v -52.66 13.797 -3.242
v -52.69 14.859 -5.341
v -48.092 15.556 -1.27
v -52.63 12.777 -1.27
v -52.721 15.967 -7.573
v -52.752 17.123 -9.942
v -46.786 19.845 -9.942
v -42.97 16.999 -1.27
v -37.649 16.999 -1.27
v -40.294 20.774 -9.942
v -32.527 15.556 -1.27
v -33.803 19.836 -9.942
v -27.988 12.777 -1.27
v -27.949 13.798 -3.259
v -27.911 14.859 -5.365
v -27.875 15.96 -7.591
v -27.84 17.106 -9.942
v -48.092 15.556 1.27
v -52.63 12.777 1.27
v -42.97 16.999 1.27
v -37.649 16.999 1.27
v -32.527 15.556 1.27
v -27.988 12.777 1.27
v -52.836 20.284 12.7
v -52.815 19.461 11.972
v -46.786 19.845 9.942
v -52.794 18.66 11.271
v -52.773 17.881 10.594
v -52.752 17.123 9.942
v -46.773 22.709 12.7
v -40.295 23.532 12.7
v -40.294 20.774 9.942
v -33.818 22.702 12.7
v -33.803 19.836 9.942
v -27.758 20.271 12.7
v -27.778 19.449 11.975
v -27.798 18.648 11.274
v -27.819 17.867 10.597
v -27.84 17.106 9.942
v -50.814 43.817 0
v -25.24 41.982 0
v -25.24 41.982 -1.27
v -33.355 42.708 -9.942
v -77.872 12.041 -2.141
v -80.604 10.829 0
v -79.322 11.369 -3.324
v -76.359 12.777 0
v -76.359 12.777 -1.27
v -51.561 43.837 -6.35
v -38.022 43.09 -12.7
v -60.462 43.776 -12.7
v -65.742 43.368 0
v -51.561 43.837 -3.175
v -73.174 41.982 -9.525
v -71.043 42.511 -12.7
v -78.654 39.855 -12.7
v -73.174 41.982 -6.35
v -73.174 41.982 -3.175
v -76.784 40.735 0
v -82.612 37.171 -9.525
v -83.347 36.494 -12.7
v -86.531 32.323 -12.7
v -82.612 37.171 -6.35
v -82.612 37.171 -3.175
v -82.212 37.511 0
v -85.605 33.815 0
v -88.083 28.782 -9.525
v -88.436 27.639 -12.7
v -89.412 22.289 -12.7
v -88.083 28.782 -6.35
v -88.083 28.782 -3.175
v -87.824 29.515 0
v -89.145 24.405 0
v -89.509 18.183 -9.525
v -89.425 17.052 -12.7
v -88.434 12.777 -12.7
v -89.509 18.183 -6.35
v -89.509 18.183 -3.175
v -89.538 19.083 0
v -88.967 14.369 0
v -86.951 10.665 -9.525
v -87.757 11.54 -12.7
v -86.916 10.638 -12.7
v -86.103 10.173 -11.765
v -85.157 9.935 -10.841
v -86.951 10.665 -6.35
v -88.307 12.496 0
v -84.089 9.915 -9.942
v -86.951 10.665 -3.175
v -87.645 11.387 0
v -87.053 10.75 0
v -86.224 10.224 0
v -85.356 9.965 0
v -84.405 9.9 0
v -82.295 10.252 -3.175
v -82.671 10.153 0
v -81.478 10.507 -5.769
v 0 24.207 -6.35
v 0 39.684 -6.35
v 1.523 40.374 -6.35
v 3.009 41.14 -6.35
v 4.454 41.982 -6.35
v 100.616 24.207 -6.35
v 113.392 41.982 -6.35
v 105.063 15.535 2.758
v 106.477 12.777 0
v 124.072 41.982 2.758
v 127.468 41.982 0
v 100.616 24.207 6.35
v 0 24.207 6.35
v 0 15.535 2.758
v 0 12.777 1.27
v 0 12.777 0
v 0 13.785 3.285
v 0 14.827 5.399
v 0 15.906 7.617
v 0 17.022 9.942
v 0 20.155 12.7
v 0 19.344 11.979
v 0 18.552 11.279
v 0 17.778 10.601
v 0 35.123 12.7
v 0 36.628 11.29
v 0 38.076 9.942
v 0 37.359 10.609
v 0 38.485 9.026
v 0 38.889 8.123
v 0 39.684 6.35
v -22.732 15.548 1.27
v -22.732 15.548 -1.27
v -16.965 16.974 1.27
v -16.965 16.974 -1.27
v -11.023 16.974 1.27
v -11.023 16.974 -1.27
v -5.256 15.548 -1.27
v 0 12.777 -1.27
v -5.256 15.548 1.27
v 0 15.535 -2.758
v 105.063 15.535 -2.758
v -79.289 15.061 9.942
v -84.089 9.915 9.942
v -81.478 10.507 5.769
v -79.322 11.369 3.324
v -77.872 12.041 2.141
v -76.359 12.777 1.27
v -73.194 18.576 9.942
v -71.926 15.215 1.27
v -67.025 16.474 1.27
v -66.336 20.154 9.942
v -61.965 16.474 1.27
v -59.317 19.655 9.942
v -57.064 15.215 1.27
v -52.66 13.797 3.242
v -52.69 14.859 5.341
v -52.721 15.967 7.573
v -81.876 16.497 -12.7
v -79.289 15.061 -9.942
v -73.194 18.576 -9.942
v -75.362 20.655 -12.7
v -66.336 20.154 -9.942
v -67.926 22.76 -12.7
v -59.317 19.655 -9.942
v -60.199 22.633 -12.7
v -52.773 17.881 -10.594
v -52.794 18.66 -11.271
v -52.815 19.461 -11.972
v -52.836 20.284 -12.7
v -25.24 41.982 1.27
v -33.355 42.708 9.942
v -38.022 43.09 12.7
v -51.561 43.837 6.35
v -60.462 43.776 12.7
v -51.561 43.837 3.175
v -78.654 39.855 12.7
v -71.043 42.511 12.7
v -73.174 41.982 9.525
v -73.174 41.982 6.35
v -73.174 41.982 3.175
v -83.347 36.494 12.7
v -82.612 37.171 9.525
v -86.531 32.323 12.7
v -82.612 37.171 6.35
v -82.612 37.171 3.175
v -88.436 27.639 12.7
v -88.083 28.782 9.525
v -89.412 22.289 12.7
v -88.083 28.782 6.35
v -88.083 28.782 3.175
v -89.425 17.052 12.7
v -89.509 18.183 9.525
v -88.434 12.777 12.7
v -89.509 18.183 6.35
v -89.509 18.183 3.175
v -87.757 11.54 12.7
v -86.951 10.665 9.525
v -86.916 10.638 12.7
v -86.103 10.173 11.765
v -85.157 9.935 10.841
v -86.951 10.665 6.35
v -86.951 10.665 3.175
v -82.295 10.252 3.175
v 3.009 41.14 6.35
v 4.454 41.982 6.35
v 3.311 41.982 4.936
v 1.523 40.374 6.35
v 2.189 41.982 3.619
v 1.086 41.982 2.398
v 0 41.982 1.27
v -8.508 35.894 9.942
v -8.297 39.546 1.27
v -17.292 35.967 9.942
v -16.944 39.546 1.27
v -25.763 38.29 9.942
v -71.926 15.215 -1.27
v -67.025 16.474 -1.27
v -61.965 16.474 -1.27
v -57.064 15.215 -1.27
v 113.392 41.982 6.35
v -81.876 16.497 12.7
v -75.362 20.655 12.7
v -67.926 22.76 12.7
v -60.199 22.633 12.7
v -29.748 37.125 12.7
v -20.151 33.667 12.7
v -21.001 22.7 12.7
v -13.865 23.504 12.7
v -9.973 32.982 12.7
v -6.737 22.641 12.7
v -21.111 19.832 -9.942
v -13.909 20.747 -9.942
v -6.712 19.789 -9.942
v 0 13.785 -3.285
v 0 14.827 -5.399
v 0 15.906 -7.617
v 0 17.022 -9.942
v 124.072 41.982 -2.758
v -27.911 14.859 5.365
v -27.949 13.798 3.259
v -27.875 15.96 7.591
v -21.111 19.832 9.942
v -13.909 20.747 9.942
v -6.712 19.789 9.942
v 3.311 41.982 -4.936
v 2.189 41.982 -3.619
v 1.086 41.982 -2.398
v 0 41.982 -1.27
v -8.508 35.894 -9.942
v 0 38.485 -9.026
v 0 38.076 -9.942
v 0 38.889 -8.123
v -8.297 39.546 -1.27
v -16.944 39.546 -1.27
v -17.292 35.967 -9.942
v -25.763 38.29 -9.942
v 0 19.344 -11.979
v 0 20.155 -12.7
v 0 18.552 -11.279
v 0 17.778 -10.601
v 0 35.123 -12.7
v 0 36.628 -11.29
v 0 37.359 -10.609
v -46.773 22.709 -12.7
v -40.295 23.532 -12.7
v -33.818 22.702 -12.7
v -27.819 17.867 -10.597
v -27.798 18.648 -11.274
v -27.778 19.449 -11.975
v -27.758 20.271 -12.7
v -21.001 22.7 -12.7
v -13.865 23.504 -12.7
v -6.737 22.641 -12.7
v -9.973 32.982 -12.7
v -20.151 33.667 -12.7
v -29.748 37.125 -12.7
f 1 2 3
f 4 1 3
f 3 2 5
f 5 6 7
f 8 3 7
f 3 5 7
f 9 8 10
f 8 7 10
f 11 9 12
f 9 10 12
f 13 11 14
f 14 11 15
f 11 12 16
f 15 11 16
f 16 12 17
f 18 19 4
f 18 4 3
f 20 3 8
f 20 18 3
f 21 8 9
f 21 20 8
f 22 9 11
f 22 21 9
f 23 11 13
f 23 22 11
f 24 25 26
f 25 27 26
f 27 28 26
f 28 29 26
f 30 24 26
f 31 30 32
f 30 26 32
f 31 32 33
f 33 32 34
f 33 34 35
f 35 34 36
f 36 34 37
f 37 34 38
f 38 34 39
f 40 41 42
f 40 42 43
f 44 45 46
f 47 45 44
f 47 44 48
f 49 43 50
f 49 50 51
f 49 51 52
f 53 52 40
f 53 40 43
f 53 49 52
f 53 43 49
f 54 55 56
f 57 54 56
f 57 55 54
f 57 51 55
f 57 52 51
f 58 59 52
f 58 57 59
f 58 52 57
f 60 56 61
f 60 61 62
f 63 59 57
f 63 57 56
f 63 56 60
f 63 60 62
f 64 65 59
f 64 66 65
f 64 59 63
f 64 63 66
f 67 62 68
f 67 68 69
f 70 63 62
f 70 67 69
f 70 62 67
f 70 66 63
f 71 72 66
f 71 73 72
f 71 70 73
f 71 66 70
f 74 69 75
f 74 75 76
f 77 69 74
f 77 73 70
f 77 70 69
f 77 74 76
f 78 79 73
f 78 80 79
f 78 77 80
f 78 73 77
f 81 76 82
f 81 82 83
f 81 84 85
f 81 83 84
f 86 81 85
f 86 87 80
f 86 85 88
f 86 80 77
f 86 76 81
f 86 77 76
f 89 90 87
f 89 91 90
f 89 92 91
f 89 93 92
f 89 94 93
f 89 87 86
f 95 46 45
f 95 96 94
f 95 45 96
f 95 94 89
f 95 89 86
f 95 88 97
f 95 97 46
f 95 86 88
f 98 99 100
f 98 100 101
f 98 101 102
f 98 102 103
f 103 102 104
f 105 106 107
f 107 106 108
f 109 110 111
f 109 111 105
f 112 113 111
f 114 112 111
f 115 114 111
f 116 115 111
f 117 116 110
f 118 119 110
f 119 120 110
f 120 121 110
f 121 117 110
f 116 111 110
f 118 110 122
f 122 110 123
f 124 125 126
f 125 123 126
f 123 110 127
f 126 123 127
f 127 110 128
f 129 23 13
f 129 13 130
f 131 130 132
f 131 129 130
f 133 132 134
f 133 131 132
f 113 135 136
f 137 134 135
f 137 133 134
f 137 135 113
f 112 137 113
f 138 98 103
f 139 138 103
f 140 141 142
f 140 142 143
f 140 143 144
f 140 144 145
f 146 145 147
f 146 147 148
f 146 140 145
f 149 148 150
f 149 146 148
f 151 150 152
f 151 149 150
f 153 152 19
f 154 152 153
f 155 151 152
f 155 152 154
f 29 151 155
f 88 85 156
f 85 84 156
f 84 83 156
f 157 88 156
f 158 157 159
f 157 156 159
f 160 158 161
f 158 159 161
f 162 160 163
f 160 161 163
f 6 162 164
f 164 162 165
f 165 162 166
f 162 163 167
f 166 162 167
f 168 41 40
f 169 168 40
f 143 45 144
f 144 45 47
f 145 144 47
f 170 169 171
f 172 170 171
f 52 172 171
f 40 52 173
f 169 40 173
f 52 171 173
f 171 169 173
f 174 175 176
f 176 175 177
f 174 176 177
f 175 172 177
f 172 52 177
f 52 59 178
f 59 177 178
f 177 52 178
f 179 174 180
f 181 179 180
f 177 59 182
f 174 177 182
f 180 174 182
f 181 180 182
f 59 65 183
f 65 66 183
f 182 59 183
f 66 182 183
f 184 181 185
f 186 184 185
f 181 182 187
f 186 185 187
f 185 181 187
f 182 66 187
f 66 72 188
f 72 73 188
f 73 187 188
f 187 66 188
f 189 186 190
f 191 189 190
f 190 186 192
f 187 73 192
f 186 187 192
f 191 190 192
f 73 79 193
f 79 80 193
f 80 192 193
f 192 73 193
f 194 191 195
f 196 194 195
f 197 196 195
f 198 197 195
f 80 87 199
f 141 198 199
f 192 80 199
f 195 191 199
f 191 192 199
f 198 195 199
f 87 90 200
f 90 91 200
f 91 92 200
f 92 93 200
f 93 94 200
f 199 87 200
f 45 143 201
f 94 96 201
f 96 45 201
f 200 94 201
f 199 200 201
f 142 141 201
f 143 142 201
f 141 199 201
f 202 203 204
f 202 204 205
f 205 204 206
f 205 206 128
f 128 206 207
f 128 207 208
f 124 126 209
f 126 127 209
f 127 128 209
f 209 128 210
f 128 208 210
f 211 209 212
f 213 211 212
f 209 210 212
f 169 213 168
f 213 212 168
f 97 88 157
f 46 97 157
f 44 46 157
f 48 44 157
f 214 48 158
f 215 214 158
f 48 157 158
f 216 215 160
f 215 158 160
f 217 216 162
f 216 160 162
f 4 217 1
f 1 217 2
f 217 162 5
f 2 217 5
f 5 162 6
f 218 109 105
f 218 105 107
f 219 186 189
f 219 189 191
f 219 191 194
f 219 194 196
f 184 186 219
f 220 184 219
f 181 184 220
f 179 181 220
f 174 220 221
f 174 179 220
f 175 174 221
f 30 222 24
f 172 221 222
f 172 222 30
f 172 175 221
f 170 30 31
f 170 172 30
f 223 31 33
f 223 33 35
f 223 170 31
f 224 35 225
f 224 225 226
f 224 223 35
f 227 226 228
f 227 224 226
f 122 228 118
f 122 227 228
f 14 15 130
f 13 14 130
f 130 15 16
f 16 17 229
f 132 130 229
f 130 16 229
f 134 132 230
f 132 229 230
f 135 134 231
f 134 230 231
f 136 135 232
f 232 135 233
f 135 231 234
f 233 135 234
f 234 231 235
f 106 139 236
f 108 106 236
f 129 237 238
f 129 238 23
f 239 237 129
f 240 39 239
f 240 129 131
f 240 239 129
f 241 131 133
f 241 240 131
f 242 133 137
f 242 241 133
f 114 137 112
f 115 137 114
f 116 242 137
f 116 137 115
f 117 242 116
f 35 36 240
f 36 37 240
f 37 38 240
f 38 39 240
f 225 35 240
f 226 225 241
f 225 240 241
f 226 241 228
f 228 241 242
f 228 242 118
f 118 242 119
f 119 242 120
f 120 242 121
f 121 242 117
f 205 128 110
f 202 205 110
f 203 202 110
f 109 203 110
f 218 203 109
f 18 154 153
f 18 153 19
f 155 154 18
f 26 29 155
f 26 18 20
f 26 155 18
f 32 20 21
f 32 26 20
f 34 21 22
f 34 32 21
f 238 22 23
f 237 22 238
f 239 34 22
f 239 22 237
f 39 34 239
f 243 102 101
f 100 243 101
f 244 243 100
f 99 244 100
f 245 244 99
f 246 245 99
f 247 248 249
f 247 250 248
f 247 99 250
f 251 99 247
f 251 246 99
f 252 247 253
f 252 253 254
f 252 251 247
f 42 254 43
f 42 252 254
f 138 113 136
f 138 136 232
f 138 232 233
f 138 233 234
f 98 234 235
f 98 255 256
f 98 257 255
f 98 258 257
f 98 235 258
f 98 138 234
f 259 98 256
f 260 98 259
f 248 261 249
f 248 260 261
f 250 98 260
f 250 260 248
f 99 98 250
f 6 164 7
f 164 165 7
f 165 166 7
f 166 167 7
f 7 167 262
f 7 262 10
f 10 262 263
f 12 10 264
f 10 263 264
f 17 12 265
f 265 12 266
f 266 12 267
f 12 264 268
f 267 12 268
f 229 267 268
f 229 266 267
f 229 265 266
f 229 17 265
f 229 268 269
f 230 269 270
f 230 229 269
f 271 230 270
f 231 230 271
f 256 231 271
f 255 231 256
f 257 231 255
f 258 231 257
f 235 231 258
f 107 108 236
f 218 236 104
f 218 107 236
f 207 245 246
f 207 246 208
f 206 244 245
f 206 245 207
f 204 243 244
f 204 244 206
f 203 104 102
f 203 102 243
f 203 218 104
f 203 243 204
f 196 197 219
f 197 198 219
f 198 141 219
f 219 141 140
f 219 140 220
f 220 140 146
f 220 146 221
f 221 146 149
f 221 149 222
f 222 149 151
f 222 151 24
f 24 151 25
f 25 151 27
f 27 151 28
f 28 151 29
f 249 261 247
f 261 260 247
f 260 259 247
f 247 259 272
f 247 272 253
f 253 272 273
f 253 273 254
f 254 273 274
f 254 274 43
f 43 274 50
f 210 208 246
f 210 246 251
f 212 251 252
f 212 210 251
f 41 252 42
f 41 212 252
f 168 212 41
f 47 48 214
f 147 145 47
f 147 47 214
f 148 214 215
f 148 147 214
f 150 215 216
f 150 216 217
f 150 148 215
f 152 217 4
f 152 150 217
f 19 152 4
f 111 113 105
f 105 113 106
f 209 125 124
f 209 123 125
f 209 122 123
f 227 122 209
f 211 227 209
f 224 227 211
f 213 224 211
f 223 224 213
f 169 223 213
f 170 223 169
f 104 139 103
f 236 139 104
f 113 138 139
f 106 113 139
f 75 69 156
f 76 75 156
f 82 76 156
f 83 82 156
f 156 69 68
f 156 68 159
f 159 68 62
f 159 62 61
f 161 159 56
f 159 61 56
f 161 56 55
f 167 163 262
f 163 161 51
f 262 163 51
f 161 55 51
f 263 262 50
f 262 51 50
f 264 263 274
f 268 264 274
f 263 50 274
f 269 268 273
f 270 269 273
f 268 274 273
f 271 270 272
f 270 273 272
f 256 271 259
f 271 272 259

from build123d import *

# Parameters (mm, degrees)
F1_DEPTH      = 6.35
F1_DEPTH_BACK = 6.35
F2_DEPTH      = 12.7
F2_DEPTH_BACK = 12.7
F3_SIZE       = 6.34999
F4_SIZE       = 6.35
F5_T2_ANGLE   = 130.9531767825
F5_T4_ANGLE   = 156.3789559007
F5_T6_ANGLE   = 146.8131509544
F5_T8_ANGLE   = 146.8131509544
F5_T10_ANGLE  = 156.3789559007
F5_T12_ANGLE  = 130.9531767825
F5_T14_ANGLE  = 98.8047724995
F5_T16_ANGLE  = 98.8047724995
F6_SIZE       = 5.08


# Not quite as in the source:
# - a fillet or chamfer that OpenCascade refuses, or shapes differently, is made with other operations: its cross-section is extruded or revolved along the edge and cut away or added
# - a fillet or chamfer is up to 0.001 mm smaller than in the source, because OpenCascade refuses the exact size


with BuildPart() as f1:
    # F0 (on Top) → F1 (new body, two sides)
    with BuildSketch(Plane.XY) as f1_sk:
        Polygon((127.4684071541, 41.98243469), (0, 41.98243469), (0, 12.7772623673), (106.4771935344, 12.7772623673), align=None)
    extrude(amount=F1_DEPTH)
    extrude(f1_sk.sketch, amount=-F1_DEPTH_BACK)

    # F0 (on Top) → F2 (join, two sides)
    with BuildSketch(Plane.XY) as f2_sk:
        with BuildLine():
            Line((0, 12.7772623673), (0, 41.98243469))
            ThreePointArc((0, 41.98243469), (-12.6201109961, 39.2362751187), (-25.2402219921, 41.98243469))
            add(Edge.make_bspline(
                [(-25.2402219921, 41.98243469), (-43.3102802692, 43.6309922068), (-73.0269834828, 46.3420899634), (-90.5393262642, 31.6872008955), (-89.8712560793, 6.151344998), (-80.4582887069, 10.7672416687), (-76.3593539596, 12.7772623673)],
                knots=[0, 0, 0, 0, 0.3656879222, 0.6013837524, 0.8264200944, 1, 1, 1, 1], degree=3))
            ThreePointArc((-76.3593539596, 12.7772623673), (-64.4947532564, 16.6330166618), (-52.6301525533, 12.7772623673))
            ThreePointArc((-52.6301525533, 12.7772623673), (-40.3092205524, 17.1822695756), (-27.9882885516, 12.7772623673))
            ThreePointArc((-27.9882885516, 12.7772623673), (-13.9941442758, 17.1547227044), (0, 12.7772623673))
        make_face()
    extrude(amount=F2_DEPTH)
    extrude(f2_sk.sketch, amount=-F2_DEPTH_BACK)

    # F3 (size 6.35 in the source; OpenCascade refuses exactly that, so slightly less here)
    f3_edges = [f1.edges().sort_by_distance(p)[0] for p in [
        (53.238597, 12.777262, 6.35),
        (116.9728, 27.379849, 6.35),
        (116.9728, 27.379849, -6.35),
        (53.238597, 12.777262, -6.35),
    ]]
    chamfer(f3_edges, length=F3_SIZE)

    # F4
    f4_edges = [f1.edges().sort_by_distance(p)[0] for p in [
        (-40.309221, 17.18227, 12.7),
        (-13.994144, 17.154723, 12.7),
        (-64.494753, 16.633017, 12.7),
        (-13.994144, 17.154723, -12.7),
        (-40.309221, 17.18227, -12.7),
        (-64.494753, 16.633017, -12.7),
        (-12.620111, 39.236275, 12.7),
        (-12.620111, 39.236275, -12.7),
    ]]
    chamfer(f4_edges, length=F4_SIZE)

    # F5: chamfer of 5.08 on 8 edges, made by hand

    # F5_s1 → F5_t2 (revolve, cut)
    with BuildSketch(Plane(origin=(-5.206322323, -11.4118722971, 0), x_dir=(0, 0, 1), z_dir=(-0.415065027, -0.9097917473, 0))):
        Polygon((1.27, 34.2165741448), (9.9421024484, 37.8086765933), (6.35, 34.2165741448), align=None)
    revolve(axis=Axis((-13.9941442758, -7.4026937493, 6.35), (0, 0, -1)), revolution_arc=F5_T2_ANGLE, mode=Mode.SUBTRACT)

    # F5_s3 → F5_t4 (revolve, cut)
    with BuildSketch(Plane(origin=(-2.139660104, -10.2325872802, 0), x_dir=(0, 0, 1), z_dir=(-0.2046758119, -0.9788298177, 0))):
        Polygon((1.27, 58.4285980846), (9.9421024484, 62.020700533), (6.35, 58.4285980846), align=None)
    revolve(axis=Axis((-40.3092205524, -2.2512348183, 6.35), (0, 0, -1)), revolution_arc=F5_T4_ANGLE, mode=Mode.SUBTRACT)

    # F5_s5 → F5_t6 (revolve, cut)
    with BuildSketch(Plane(origin=(-6.2312443492, -20.9110587705, 0), x_dir=(0, 0, 1), z_dir=(-0.2855783849, -0.9583553548, 0))):
        Polygon((1.27, 80.9775575206), (9.9421024484, 84.569659969), (6.35, 80.9775575206), align=None)
    revolve(axis=Axis((-64.4947532564, -3.5492329237, 6.35), (0, 0, -1)), revolution_arc=F5_T6_ANGLE, mode=Mode.SUBTRACT)

    # F5_s7 → F5_t8 (revolve, cut)
    with BuildSketch(Plane(origin=(-6.2312443492, -20.9110587705, 0), x_dir=(0, 0, 1), z_dir=(-0.2855783849, -0.9583553548, 0))):
        Polygon((-1.27, 80.9775575206), (-9.9421024484, 84.569659969), (-6.35, 80.9775575206), align=None)
    revolve(axis=Axis((-64.4947532564, -3.5492329237, -6.35), (0, 0, -1)), revolution_arc=F5_T8_ANGLE, mode=Mode.SUBTRACT)

    # F5_s9 → F5_t10 (revolve, cut)
    with BuildSketch(Plane(origin=(-2.139660104, -10.2325872802, 0), x_dir=(0, 0, 1), z_dir=(-0.2046758119, -0.9788298177, 0))):
        Polygon((-1.27, 58.4285980846), (-9.9421024484, 62.020700533), (-6.35, 58.4285980846), align=None)
    revolve(axis=Axis((-40.3092205524, -2.2512348183, -6.35), (0, 0, -1)), revolution_arc=F5_T10_ANGLE, mode=Mode.SUBTRACT)

    # F5_s11 → F5_t12 (revolve, cut)
    with BuildSketch(Plane(origin=(-5.206322323, -11.4118722971, 0), x_dir=(0, 0, 1), z_dir=(-0.415065027, -0.9097917473, 0))):
        Polygon((-1.27, 34.2165741448), (-9.9421024484, 37.8086765933), (-6.35, 34.2165741448), align=None)
    revolve(axis=Axis((-13.9941442758, -7.4026937493, -6.35), (0, 0, -1)), revolution_arc=F5_T12_ANGLE, mode=Mode.SUBTRACT)

    # F5_s13 → F5_t14 (revolve, cut)
    with BuildSketch(Plane(origin=(29.0494350025, 33.895414243, 0), x_dir=(0, 0, 1), z_dir=(0.6507425946, 0.7592984101, 0))):
        Polygon((9.9421024484, -20.9156595103), (1.27, -24.5077619587), (6.35, -24.5077619587), align=None)
    revolve(axis=Axis((-12.6201109961, 69.6075244238, 6.35), (0, 0, -1)), revolution_arc=F5_T14_ANGLE, mode=Mode.SUBTRACT)

    # F5_s15 → F5_t16 (revolve, cut)
    with BuildSketch(Plane(origin=(29.0494350025, 33.895414243, 0), x_dir=(0, 0, 1), z_dir=(0.6507425946, 0.7592984101, 0))):
        Polygon((-9.9421024484, -20.9156595103), (-1.27, -24.5077619587), (-6.35, -24.5077619587), align=None)
    revolve(axis=Axis((-12.6201109961, 69.6075244238, -6.35), (0, 0, -1)), revolution_arc=F5_T16_ANGLE, mode=Mode.SUBTRACT)

    # F6
    f6_edges = [f1.edges().sort_by_distance(p)[0] for p in [
        (111.434791, 30.554844, -6.35),
        (51.610606, 19.127252, -6.35),
        (111.434791, 30.554844, 6.35),
        (51.610606, 19.127252, 6.35),
    ]]
    chamfer(f6_edges, length=F6_SIZE)


solid = f1.part
